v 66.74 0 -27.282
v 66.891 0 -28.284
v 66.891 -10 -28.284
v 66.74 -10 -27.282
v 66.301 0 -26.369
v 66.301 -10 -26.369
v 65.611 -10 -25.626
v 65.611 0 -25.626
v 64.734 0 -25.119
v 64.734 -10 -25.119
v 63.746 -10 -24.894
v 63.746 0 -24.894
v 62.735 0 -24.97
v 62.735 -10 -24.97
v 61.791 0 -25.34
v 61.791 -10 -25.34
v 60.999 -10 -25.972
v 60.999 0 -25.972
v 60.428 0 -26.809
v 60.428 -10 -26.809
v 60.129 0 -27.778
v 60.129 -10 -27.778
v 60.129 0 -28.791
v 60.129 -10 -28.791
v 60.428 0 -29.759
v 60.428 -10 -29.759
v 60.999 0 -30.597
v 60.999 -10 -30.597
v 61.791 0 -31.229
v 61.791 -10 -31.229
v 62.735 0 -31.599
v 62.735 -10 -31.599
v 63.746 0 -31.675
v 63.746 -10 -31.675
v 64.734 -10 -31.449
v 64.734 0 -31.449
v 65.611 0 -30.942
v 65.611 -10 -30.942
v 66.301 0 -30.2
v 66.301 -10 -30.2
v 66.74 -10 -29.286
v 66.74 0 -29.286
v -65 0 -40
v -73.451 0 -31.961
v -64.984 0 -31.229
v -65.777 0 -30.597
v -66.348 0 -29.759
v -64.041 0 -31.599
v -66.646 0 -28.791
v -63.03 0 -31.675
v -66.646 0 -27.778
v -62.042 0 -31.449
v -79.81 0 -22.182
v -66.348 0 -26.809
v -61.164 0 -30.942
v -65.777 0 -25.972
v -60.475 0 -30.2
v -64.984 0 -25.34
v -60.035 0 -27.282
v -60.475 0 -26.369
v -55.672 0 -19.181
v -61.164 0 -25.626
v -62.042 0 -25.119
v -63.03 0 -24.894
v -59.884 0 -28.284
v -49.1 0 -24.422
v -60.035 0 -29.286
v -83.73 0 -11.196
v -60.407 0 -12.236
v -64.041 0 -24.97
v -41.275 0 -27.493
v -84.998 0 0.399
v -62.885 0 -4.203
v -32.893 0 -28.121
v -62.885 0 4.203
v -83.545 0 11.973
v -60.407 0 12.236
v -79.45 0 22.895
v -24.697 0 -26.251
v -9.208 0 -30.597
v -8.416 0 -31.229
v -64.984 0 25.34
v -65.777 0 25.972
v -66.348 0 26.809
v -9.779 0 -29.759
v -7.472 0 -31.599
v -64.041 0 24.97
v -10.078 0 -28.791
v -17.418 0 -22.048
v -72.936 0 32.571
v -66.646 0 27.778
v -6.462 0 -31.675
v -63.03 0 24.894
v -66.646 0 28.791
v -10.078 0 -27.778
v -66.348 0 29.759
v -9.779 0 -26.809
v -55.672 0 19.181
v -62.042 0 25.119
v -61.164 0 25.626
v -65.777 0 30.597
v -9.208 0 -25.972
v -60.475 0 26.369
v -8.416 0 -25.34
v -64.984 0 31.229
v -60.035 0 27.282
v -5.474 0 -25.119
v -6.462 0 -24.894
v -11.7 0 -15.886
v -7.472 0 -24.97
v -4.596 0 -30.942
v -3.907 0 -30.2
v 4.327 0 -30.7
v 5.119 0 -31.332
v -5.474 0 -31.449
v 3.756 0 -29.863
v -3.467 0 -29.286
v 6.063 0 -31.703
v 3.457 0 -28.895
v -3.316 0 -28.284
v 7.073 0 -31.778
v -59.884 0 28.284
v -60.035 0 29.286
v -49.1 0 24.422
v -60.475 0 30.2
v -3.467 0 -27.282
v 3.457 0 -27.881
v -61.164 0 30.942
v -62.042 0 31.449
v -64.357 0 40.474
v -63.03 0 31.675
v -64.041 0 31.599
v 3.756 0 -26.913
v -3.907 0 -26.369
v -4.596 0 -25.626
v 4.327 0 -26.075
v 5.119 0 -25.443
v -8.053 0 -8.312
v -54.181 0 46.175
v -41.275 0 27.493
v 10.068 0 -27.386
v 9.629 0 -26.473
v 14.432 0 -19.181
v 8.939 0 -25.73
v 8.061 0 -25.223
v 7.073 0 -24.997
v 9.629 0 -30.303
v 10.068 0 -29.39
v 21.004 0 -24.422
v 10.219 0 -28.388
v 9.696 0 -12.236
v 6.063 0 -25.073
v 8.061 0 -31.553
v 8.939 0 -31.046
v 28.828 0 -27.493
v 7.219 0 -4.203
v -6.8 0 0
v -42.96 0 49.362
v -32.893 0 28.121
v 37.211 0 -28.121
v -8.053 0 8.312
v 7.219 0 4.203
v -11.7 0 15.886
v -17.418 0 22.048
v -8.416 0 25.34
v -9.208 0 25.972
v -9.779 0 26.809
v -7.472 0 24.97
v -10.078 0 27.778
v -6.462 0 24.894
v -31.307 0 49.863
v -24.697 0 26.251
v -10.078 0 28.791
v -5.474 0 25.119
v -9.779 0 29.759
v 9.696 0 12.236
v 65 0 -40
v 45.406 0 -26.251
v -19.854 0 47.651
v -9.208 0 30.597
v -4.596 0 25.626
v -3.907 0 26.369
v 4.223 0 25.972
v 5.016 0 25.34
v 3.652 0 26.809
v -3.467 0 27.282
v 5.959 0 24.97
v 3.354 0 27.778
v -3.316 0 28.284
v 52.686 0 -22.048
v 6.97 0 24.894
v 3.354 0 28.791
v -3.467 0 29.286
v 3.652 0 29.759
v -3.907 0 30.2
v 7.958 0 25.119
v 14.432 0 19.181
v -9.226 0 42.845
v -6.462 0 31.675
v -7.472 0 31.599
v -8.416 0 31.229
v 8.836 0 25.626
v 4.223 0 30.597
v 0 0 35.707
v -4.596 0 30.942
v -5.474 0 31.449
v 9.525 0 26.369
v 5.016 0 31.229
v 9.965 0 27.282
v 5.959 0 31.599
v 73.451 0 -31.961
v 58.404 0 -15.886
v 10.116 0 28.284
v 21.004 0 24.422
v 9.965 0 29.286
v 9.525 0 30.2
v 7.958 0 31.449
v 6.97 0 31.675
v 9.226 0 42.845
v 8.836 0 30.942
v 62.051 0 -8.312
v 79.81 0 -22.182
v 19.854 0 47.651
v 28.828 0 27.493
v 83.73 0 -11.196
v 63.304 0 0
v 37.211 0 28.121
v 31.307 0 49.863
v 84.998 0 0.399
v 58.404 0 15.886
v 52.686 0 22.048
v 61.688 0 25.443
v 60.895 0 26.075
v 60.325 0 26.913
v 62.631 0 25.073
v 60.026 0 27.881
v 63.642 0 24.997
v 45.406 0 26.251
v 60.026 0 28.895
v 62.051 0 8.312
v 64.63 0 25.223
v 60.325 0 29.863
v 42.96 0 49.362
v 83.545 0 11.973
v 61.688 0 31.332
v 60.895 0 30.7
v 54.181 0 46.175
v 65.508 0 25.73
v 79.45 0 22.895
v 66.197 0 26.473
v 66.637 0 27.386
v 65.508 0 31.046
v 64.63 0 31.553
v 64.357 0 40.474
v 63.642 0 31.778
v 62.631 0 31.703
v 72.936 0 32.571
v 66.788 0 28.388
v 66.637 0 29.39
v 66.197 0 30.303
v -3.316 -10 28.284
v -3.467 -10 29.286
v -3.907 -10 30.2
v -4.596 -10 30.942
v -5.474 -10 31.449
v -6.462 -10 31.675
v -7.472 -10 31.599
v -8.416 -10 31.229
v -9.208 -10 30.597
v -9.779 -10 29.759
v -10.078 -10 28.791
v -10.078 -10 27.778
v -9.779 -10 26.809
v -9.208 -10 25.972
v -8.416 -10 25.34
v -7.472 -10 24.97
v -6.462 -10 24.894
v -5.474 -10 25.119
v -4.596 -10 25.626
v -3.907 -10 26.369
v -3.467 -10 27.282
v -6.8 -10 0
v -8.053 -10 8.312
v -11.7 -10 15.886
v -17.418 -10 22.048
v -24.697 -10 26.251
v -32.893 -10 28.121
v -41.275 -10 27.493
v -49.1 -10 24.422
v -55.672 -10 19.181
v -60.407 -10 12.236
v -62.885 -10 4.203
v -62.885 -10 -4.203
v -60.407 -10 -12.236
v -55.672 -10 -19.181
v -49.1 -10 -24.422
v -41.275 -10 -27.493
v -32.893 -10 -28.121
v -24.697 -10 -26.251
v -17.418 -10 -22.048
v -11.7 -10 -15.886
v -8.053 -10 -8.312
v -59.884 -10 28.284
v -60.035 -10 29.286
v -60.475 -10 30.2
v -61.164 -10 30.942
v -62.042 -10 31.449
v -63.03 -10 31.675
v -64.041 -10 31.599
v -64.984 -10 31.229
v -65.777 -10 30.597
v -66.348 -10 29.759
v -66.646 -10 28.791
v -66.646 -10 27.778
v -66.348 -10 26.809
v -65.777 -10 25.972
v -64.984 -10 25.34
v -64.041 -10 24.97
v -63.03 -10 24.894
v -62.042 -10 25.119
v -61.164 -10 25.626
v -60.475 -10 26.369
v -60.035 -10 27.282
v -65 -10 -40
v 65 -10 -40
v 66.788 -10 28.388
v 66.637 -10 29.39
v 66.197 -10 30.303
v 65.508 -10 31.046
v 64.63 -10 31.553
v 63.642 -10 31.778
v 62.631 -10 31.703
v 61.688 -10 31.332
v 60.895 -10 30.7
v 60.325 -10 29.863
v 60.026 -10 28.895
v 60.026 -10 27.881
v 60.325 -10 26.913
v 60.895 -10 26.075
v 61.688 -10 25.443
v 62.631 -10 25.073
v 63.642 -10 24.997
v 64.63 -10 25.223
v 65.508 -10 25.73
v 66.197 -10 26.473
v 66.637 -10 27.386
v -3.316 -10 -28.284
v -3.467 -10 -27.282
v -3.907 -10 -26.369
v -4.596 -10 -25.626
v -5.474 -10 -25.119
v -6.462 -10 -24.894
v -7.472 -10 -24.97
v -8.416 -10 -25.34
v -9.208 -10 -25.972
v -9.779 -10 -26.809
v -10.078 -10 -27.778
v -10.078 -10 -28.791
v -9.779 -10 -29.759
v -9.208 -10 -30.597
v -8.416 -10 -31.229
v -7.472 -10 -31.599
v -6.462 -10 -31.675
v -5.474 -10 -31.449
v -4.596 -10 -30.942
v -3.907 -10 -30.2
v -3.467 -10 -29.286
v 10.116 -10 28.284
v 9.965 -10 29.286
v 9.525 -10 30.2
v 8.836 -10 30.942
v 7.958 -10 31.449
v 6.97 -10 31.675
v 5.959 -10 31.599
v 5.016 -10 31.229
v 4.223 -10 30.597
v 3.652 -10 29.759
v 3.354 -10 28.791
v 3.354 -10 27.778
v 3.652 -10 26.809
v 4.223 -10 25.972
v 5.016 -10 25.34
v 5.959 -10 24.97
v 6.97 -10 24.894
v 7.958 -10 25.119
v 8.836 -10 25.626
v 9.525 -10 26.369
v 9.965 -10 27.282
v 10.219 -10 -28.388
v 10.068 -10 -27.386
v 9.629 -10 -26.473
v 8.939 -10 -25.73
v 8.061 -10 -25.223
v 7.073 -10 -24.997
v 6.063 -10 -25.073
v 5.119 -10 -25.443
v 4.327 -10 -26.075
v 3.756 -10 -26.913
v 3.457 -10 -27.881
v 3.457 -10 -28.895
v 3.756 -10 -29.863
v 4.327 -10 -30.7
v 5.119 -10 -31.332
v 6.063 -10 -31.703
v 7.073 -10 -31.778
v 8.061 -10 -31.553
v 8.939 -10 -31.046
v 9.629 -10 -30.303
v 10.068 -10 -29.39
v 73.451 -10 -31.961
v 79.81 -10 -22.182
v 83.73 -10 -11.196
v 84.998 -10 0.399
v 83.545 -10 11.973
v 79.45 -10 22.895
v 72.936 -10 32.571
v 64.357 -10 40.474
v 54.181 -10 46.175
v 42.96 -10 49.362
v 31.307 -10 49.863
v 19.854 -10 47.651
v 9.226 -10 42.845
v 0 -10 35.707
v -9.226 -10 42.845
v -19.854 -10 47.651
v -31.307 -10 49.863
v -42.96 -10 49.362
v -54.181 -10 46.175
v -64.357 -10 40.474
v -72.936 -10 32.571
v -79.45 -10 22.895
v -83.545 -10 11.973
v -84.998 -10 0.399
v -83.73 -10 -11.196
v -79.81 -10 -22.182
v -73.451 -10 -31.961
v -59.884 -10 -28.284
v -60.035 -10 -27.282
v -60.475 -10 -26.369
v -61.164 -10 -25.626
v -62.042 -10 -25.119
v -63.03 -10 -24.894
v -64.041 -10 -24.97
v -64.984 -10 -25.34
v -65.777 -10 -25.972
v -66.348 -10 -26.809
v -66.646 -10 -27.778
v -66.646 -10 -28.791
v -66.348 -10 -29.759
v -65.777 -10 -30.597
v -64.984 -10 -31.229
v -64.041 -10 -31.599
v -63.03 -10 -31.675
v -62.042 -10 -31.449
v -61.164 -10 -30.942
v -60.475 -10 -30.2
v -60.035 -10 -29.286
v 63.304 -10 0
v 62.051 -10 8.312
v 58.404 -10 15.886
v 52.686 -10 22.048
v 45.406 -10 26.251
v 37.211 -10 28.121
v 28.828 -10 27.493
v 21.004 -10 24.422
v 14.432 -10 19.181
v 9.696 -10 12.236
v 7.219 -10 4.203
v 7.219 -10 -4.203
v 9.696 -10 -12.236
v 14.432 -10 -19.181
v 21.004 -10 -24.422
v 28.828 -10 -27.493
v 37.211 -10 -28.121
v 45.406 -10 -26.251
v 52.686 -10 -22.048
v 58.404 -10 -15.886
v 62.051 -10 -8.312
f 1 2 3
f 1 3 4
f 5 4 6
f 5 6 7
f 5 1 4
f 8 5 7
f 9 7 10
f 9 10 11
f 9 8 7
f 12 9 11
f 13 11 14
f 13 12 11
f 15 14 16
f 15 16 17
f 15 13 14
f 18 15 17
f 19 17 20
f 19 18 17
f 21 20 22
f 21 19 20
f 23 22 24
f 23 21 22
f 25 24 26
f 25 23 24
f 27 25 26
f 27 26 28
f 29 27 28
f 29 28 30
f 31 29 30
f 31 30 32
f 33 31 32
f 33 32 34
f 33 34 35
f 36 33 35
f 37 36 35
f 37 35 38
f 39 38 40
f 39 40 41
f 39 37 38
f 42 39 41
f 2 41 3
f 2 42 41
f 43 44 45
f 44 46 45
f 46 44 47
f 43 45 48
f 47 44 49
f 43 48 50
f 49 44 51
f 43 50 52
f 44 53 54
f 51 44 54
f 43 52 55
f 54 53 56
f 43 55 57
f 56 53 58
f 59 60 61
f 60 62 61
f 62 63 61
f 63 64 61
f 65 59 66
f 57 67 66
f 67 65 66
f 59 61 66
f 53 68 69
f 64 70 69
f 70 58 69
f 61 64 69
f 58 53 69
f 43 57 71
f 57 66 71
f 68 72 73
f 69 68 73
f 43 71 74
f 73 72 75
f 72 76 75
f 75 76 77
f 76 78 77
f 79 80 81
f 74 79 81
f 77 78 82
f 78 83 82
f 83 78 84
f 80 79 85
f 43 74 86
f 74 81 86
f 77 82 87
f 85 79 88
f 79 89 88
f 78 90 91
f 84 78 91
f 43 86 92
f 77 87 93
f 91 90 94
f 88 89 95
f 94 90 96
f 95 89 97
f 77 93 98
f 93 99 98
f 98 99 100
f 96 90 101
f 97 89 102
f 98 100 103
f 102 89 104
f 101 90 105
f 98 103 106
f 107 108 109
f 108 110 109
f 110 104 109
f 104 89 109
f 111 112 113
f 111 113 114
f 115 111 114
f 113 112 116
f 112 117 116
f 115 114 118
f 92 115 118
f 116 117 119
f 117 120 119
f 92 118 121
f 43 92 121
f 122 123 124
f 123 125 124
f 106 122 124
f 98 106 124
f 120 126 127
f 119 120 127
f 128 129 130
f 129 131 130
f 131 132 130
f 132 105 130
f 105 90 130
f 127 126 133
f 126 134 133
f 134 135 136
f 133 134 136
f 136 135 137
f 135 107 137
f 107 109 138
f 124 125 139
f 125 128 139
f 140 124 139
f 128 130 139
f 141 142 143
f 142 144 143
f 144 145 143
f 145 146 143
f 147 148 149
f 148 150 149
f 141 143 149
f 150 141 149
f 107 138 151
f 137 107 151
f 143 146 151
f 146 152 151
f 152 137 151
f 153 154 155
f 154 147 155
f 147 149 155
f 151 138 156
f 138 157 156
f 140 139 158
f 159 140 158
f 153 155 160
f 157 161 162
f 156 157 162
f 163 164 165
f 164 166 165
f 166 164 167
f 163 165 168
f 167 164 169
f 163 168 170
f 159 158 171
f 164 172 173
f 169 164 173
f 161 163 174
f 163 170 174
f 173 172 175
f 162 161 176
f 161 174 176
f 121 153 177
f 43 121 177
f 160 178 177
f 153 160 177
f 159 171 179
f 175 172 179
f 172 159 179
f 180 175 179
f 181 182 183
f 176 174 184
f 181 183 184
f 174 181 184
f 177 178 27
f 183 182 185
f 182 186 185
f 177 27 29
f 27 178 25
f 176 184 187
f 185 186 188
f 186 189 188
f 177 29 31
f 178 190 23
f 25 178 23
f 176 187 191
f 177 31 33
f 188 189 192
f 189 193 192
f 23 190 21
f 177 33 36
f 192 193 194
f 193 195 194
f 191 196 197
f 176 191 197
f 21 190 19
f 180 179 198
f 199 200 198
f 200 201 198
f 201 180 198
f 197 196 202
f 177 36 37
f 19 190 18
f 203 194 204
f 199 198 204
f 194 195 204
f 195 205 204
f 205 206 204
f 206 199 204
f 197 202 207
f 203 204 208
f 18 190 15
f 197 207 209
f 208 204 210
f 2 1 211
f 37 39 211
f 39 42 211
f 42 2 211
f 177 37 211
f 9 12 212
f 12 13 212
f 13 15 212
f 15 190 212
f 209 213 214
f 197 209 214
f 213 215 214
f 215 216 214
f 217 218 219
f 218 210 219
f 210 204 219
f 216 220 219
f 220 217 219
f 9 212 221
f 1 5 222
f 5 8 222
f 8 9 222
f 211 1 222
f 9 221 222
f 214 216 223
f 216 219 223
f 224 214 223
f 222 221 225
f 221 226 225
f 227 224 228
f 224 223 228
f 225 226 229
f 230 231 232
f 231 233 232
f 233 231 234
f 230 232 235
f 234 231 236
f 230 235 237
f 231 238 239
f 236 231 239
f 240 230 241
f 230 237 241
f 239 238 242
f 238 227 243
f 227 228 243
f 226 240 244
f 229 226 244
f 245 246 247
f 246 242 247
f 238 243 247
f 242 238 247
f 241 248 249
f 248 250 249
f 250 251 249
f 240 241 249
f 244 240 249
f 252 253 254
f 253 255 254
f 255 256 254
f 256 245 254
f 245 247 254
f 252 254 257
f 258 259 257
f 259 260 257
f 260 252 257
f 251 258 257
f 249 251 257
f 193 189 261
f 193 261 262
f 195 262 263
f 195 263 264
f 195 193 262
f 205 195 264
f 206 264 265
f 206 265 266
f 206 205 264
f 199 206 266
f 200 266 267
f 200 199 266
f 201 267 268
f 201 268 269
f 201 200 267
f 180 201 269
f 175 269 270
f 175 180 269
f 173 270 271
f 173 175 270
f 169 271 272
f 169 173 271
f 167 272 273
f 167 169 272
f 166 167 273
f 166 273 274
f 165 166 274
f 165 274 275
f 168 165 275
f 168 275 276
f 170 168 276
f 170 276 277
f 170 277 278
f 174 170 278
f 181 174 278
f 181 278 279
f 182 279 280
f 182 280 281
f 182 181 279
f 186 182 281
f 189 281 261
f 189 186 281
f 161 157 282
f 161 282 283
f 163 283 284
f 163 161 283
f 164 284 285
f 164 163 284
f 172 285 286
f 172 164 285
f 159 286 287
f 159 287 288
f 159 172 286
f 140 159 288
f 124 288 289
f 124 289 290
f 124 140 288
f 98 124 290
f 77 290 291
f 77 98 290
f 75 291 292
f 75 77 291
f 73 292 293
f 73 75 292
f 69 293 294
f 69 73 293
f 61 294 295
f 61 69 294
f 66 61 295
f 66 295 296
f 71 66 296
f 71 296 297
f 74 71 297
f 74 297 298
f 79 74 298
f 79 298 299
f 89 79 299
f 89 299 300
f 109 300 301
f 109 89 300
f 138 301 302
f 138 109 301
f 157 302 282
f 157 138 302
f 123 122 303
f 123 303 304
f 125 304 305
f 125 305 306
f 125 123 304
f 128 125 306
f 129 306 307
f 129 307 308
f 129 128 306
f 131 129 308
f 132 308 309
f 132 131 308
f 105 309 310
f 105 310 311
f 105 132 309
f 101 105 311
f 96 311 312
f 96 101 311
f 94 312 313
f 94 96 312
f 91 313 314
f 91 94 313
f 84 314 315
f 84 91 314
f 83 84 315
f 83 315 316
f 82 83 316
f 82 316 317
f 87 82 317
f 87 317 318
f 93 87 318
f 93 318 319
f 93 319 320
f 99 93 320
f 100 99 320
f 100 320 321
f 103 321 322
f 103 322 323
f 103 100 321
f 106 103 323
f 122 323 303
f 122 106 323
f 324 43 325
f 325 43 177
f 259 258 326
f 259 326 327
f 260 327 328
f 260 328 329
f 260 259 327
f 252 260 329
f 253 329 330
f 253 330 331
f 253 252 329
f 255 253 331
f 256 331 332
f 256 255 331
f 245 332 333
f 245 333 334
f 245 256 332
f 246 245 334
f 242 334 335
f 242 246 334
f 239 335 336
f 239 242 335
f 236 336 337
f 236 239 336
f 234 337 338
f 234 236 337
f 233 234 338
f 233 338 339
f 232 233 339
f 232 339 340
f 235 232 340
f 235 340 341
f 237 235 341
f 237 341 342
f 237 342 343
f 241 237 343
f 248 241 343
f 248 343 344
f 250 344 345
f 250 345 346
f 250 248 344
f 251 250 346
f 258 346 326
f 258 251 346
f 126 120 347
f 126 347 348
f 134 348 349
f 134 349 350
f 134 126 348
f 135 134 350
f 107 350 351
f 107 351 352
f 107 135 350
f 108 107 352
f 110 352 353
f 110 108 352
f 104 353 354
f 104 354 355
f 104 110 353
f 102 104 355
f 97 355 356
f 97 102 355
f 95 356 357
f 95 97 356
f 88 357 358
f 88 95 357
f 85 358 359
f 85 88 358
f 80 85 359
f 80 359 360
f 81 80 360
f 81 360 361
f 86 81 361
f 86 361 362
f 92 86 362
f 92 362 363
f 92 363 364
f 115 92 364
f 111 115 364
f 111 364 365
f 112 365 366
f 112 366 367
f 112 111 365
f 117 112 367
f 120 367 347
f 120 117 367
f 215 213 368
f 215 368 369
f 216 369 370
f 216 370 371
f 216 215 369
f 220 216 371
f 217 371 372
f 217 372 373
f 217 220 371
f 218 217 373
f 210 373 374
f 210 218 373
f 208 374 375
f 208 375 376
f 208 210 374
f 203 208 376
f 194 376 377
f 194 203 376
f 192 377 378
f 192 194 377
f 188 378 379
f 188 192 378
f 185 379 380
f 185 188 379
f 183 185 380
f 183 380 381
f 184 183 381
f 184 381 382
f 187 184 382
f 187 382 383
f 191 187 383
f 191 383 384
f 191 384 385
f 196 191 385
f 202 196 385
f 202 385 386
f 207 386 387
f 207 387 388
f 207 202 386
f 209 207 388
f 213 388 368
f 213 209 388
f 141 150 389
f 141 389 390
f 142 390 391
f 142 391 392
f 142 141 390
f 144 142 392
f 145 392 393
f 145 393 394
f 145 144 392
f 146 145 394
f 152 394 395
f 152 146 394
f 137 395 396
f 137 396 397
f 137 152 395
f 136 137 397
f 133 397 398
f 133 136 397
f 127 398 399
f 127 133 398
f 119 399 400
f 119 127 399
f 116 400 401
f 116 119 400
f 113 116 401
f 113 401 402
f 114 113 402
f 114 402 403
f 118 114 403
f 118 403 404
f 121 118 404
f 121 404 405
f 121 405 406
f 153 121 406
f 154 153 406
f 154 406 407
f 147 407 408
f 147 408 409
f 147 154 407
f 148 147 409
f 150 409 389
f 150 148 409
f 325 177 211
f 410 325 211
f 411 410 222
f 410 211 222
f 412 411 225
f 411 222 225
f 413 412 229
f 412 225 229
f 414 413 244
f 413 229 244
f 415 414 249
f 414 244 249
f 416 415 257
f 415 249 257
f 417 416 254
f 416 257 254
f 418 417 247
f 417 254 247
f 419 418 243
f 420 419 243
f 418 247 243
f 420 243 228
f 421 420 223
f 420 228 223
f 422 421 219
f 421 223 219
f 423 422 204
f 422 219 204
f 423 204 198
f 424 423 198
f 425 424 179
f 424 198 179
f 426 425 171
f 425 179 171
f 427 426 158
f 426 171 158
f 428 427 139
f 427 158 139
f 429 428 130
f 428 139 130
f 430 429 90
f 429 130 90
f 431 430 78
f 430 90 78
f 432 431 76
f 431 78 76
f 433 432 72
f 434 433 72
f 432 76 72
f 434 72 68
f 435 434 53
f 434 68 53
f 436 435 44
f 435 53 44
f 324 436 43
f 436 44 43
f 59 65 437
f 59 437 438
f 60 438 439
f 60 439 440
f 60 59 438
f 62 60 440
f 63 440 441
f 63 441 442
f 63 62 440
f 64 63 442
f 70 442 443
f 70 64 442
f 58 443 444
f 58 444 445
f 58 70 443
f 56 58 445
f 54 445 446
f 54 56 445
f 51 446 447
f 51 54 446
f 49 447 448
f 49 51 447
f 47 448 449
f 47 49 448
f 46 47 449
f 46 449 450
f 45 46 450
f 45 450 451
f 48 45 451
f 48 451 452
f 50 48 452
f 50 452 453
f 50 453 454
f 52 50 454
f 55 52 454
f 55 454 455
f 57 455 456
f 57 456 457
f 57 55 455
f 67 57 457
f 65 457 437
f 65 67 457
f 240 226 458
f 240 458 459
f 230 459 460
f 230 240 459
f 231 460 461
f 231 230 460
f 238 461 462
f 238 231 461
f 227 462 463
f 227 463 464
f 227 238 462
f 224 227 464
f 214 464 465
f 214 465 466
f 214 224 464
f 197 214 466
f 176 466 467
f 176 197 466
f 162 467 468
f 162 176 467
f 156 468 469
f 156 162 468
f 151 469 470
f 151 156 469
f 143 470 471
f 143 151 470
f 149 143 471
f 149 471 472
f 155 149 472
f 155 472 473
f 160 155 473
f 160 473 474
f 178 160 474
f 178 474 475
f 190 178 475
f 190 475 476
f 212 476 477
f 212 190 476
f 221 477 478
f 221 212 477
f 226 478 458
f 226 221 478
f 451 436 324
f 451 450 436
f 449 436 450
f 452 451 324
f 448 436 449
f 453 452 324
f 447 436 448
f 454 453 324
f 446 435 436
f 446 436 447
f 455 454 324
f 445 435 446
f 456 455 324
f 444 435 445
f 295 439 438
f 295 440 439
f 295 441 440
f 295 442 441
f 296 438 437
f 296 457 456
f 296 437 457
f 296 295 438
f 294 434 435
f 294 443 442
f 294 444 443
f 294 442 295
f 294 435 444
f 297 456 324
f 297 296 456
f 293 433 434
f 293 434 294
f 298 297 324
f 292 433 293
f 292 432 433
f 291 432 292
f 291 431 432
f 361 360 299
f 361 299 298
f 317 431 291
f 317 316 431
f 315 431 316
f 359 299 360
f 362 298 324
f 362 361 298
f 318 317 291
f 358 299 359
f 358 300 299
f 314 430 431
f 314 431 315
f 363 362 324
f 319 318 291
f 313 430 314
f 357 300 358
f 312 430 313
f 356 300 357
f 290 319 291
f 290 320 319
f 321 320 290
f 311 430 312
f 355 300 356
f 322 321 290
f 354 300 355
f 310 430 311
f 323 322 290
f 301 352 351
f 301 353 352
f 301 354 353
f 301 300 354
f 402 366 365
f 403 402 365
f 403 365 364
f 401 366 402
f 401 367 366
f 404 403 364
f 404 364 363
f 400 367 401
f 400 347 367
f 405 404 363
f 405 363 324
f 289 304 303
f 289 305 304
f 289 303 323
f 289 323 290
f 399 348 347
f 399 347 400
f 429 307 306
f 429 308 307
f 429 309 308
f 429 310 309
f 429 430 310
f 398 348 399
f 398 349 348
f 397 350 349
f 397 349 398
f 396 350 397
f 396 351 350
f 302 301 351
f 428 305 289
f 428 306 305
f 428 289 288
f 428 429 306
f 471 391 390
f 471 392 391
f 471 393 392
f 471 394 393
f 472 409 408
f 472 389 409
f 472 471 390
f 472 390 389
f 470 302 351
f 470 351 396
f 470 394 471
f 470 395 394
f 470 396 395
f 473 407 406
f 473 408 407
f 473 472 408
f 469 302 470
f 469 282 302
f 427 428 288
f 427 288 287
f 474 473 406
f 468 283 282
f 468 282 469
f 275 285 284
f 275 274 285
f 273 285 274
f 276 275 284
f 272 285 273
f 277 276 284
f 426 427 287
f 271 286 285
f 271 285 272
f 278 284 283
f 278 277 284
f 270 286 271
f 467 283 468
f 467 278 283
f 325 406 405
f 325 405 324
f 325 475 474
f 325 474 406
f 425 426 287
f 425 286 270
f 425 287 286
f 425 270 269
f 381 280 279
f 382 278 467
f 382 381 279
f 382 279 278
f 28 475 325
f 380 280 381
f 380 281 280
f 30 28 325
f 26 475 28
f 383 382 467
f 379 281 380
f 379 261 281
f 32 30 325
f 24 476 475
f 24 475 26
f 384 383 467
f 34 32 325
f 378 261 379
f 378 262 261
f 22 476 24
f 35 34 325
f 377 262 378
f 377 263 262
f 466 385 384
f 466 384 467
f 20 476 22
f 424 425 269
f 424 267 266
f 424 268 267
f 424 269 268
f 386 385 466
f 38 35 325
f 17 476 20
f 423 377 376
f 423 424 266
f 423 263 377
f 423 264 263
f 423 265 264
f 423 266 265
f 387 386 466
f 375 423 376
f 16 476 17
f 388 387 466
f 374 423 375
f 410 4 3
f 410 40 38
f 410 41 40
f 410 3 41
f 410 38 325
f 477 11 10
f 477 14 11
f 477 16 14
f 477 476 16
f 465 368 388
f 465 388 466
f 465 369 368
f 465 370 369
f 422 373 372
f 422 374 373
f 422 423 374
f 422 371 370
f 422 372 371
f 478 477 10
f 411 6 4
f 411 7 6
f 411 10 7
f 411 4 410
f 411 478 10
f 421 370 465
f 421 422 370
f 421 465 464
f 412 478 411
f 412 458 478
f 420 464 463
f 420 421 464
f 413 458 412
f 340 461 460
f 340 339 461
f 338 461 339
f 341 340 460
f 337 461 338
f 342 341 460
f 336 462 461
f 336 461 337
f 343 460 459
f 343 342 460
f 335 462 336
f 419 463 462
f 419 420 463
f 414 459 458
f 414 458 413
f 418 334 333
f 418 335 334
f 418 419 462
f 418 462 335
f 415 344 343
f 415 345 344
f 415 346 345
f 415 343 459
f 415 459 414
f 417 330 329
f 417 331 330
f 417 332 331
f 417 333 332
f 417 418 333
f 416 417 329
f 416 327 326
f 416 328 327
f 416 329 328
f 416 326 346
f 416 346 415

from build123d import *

# Parameters (mm, degrees)
F0_R     = 3.4
F0_R_2   = 28.2
F1_DEPTH = 10


with BuildPart() as f1:
    # F0 (on Front) → F1 (new body)
    with BuildSketch(Plane.XZ):
        with BuildLine():
            ThreePointArc((65, -40), (72.936036, 32.570802), (0, 35.707142))
            ThreePointArc((0, 35.707142), (-72.936036, 32.570802), (-65, -40))
            Line((-65, -40), (65, -40))
        make_face()
        with Locations((-63.284271, -28.284271)):
            Circle(F0_R, mode=Mode.SUBTRACT)
        with Locations((-6.715729, -28.284271)):
            Circle(F0_R, mode=Mode.SUBTRACT)
        with Locations((-35, 0)):
            Circle(F0_R_2, mode=Mode.SUBTRACT)
        with Locations((6.819313, -28.387856)):
            Circle(F0_R, mode=Mode.SUBTRACT)
        with Locations((63.49144, -28.284271)):
            Circle(F0_R, mode=Mode.SUBTRACT)
        with Locations((35.103584, 0)):
            Circle(F0_R_2, mode=Mode.SUBTRACT)
        with Locations((-63.284271, 28.284271)):
            Circle(F0_R, mode=Mode.SUBTRACT)
        with Locations((-6.715729, 28.284271)):
            Circle(F0_R, mode=Mode.SUBTRACT)
        with Locations((6.715729, 28.284271)):
            Circle(F0_R, mode=Mode.SUBTRACT)
        with Locations((63.387856, 28.387856)):
            Circle(F0_R, mode=Mode.SUBTRACT)
    extrude(amount=F1_DEPTH)


solid = f1.part
